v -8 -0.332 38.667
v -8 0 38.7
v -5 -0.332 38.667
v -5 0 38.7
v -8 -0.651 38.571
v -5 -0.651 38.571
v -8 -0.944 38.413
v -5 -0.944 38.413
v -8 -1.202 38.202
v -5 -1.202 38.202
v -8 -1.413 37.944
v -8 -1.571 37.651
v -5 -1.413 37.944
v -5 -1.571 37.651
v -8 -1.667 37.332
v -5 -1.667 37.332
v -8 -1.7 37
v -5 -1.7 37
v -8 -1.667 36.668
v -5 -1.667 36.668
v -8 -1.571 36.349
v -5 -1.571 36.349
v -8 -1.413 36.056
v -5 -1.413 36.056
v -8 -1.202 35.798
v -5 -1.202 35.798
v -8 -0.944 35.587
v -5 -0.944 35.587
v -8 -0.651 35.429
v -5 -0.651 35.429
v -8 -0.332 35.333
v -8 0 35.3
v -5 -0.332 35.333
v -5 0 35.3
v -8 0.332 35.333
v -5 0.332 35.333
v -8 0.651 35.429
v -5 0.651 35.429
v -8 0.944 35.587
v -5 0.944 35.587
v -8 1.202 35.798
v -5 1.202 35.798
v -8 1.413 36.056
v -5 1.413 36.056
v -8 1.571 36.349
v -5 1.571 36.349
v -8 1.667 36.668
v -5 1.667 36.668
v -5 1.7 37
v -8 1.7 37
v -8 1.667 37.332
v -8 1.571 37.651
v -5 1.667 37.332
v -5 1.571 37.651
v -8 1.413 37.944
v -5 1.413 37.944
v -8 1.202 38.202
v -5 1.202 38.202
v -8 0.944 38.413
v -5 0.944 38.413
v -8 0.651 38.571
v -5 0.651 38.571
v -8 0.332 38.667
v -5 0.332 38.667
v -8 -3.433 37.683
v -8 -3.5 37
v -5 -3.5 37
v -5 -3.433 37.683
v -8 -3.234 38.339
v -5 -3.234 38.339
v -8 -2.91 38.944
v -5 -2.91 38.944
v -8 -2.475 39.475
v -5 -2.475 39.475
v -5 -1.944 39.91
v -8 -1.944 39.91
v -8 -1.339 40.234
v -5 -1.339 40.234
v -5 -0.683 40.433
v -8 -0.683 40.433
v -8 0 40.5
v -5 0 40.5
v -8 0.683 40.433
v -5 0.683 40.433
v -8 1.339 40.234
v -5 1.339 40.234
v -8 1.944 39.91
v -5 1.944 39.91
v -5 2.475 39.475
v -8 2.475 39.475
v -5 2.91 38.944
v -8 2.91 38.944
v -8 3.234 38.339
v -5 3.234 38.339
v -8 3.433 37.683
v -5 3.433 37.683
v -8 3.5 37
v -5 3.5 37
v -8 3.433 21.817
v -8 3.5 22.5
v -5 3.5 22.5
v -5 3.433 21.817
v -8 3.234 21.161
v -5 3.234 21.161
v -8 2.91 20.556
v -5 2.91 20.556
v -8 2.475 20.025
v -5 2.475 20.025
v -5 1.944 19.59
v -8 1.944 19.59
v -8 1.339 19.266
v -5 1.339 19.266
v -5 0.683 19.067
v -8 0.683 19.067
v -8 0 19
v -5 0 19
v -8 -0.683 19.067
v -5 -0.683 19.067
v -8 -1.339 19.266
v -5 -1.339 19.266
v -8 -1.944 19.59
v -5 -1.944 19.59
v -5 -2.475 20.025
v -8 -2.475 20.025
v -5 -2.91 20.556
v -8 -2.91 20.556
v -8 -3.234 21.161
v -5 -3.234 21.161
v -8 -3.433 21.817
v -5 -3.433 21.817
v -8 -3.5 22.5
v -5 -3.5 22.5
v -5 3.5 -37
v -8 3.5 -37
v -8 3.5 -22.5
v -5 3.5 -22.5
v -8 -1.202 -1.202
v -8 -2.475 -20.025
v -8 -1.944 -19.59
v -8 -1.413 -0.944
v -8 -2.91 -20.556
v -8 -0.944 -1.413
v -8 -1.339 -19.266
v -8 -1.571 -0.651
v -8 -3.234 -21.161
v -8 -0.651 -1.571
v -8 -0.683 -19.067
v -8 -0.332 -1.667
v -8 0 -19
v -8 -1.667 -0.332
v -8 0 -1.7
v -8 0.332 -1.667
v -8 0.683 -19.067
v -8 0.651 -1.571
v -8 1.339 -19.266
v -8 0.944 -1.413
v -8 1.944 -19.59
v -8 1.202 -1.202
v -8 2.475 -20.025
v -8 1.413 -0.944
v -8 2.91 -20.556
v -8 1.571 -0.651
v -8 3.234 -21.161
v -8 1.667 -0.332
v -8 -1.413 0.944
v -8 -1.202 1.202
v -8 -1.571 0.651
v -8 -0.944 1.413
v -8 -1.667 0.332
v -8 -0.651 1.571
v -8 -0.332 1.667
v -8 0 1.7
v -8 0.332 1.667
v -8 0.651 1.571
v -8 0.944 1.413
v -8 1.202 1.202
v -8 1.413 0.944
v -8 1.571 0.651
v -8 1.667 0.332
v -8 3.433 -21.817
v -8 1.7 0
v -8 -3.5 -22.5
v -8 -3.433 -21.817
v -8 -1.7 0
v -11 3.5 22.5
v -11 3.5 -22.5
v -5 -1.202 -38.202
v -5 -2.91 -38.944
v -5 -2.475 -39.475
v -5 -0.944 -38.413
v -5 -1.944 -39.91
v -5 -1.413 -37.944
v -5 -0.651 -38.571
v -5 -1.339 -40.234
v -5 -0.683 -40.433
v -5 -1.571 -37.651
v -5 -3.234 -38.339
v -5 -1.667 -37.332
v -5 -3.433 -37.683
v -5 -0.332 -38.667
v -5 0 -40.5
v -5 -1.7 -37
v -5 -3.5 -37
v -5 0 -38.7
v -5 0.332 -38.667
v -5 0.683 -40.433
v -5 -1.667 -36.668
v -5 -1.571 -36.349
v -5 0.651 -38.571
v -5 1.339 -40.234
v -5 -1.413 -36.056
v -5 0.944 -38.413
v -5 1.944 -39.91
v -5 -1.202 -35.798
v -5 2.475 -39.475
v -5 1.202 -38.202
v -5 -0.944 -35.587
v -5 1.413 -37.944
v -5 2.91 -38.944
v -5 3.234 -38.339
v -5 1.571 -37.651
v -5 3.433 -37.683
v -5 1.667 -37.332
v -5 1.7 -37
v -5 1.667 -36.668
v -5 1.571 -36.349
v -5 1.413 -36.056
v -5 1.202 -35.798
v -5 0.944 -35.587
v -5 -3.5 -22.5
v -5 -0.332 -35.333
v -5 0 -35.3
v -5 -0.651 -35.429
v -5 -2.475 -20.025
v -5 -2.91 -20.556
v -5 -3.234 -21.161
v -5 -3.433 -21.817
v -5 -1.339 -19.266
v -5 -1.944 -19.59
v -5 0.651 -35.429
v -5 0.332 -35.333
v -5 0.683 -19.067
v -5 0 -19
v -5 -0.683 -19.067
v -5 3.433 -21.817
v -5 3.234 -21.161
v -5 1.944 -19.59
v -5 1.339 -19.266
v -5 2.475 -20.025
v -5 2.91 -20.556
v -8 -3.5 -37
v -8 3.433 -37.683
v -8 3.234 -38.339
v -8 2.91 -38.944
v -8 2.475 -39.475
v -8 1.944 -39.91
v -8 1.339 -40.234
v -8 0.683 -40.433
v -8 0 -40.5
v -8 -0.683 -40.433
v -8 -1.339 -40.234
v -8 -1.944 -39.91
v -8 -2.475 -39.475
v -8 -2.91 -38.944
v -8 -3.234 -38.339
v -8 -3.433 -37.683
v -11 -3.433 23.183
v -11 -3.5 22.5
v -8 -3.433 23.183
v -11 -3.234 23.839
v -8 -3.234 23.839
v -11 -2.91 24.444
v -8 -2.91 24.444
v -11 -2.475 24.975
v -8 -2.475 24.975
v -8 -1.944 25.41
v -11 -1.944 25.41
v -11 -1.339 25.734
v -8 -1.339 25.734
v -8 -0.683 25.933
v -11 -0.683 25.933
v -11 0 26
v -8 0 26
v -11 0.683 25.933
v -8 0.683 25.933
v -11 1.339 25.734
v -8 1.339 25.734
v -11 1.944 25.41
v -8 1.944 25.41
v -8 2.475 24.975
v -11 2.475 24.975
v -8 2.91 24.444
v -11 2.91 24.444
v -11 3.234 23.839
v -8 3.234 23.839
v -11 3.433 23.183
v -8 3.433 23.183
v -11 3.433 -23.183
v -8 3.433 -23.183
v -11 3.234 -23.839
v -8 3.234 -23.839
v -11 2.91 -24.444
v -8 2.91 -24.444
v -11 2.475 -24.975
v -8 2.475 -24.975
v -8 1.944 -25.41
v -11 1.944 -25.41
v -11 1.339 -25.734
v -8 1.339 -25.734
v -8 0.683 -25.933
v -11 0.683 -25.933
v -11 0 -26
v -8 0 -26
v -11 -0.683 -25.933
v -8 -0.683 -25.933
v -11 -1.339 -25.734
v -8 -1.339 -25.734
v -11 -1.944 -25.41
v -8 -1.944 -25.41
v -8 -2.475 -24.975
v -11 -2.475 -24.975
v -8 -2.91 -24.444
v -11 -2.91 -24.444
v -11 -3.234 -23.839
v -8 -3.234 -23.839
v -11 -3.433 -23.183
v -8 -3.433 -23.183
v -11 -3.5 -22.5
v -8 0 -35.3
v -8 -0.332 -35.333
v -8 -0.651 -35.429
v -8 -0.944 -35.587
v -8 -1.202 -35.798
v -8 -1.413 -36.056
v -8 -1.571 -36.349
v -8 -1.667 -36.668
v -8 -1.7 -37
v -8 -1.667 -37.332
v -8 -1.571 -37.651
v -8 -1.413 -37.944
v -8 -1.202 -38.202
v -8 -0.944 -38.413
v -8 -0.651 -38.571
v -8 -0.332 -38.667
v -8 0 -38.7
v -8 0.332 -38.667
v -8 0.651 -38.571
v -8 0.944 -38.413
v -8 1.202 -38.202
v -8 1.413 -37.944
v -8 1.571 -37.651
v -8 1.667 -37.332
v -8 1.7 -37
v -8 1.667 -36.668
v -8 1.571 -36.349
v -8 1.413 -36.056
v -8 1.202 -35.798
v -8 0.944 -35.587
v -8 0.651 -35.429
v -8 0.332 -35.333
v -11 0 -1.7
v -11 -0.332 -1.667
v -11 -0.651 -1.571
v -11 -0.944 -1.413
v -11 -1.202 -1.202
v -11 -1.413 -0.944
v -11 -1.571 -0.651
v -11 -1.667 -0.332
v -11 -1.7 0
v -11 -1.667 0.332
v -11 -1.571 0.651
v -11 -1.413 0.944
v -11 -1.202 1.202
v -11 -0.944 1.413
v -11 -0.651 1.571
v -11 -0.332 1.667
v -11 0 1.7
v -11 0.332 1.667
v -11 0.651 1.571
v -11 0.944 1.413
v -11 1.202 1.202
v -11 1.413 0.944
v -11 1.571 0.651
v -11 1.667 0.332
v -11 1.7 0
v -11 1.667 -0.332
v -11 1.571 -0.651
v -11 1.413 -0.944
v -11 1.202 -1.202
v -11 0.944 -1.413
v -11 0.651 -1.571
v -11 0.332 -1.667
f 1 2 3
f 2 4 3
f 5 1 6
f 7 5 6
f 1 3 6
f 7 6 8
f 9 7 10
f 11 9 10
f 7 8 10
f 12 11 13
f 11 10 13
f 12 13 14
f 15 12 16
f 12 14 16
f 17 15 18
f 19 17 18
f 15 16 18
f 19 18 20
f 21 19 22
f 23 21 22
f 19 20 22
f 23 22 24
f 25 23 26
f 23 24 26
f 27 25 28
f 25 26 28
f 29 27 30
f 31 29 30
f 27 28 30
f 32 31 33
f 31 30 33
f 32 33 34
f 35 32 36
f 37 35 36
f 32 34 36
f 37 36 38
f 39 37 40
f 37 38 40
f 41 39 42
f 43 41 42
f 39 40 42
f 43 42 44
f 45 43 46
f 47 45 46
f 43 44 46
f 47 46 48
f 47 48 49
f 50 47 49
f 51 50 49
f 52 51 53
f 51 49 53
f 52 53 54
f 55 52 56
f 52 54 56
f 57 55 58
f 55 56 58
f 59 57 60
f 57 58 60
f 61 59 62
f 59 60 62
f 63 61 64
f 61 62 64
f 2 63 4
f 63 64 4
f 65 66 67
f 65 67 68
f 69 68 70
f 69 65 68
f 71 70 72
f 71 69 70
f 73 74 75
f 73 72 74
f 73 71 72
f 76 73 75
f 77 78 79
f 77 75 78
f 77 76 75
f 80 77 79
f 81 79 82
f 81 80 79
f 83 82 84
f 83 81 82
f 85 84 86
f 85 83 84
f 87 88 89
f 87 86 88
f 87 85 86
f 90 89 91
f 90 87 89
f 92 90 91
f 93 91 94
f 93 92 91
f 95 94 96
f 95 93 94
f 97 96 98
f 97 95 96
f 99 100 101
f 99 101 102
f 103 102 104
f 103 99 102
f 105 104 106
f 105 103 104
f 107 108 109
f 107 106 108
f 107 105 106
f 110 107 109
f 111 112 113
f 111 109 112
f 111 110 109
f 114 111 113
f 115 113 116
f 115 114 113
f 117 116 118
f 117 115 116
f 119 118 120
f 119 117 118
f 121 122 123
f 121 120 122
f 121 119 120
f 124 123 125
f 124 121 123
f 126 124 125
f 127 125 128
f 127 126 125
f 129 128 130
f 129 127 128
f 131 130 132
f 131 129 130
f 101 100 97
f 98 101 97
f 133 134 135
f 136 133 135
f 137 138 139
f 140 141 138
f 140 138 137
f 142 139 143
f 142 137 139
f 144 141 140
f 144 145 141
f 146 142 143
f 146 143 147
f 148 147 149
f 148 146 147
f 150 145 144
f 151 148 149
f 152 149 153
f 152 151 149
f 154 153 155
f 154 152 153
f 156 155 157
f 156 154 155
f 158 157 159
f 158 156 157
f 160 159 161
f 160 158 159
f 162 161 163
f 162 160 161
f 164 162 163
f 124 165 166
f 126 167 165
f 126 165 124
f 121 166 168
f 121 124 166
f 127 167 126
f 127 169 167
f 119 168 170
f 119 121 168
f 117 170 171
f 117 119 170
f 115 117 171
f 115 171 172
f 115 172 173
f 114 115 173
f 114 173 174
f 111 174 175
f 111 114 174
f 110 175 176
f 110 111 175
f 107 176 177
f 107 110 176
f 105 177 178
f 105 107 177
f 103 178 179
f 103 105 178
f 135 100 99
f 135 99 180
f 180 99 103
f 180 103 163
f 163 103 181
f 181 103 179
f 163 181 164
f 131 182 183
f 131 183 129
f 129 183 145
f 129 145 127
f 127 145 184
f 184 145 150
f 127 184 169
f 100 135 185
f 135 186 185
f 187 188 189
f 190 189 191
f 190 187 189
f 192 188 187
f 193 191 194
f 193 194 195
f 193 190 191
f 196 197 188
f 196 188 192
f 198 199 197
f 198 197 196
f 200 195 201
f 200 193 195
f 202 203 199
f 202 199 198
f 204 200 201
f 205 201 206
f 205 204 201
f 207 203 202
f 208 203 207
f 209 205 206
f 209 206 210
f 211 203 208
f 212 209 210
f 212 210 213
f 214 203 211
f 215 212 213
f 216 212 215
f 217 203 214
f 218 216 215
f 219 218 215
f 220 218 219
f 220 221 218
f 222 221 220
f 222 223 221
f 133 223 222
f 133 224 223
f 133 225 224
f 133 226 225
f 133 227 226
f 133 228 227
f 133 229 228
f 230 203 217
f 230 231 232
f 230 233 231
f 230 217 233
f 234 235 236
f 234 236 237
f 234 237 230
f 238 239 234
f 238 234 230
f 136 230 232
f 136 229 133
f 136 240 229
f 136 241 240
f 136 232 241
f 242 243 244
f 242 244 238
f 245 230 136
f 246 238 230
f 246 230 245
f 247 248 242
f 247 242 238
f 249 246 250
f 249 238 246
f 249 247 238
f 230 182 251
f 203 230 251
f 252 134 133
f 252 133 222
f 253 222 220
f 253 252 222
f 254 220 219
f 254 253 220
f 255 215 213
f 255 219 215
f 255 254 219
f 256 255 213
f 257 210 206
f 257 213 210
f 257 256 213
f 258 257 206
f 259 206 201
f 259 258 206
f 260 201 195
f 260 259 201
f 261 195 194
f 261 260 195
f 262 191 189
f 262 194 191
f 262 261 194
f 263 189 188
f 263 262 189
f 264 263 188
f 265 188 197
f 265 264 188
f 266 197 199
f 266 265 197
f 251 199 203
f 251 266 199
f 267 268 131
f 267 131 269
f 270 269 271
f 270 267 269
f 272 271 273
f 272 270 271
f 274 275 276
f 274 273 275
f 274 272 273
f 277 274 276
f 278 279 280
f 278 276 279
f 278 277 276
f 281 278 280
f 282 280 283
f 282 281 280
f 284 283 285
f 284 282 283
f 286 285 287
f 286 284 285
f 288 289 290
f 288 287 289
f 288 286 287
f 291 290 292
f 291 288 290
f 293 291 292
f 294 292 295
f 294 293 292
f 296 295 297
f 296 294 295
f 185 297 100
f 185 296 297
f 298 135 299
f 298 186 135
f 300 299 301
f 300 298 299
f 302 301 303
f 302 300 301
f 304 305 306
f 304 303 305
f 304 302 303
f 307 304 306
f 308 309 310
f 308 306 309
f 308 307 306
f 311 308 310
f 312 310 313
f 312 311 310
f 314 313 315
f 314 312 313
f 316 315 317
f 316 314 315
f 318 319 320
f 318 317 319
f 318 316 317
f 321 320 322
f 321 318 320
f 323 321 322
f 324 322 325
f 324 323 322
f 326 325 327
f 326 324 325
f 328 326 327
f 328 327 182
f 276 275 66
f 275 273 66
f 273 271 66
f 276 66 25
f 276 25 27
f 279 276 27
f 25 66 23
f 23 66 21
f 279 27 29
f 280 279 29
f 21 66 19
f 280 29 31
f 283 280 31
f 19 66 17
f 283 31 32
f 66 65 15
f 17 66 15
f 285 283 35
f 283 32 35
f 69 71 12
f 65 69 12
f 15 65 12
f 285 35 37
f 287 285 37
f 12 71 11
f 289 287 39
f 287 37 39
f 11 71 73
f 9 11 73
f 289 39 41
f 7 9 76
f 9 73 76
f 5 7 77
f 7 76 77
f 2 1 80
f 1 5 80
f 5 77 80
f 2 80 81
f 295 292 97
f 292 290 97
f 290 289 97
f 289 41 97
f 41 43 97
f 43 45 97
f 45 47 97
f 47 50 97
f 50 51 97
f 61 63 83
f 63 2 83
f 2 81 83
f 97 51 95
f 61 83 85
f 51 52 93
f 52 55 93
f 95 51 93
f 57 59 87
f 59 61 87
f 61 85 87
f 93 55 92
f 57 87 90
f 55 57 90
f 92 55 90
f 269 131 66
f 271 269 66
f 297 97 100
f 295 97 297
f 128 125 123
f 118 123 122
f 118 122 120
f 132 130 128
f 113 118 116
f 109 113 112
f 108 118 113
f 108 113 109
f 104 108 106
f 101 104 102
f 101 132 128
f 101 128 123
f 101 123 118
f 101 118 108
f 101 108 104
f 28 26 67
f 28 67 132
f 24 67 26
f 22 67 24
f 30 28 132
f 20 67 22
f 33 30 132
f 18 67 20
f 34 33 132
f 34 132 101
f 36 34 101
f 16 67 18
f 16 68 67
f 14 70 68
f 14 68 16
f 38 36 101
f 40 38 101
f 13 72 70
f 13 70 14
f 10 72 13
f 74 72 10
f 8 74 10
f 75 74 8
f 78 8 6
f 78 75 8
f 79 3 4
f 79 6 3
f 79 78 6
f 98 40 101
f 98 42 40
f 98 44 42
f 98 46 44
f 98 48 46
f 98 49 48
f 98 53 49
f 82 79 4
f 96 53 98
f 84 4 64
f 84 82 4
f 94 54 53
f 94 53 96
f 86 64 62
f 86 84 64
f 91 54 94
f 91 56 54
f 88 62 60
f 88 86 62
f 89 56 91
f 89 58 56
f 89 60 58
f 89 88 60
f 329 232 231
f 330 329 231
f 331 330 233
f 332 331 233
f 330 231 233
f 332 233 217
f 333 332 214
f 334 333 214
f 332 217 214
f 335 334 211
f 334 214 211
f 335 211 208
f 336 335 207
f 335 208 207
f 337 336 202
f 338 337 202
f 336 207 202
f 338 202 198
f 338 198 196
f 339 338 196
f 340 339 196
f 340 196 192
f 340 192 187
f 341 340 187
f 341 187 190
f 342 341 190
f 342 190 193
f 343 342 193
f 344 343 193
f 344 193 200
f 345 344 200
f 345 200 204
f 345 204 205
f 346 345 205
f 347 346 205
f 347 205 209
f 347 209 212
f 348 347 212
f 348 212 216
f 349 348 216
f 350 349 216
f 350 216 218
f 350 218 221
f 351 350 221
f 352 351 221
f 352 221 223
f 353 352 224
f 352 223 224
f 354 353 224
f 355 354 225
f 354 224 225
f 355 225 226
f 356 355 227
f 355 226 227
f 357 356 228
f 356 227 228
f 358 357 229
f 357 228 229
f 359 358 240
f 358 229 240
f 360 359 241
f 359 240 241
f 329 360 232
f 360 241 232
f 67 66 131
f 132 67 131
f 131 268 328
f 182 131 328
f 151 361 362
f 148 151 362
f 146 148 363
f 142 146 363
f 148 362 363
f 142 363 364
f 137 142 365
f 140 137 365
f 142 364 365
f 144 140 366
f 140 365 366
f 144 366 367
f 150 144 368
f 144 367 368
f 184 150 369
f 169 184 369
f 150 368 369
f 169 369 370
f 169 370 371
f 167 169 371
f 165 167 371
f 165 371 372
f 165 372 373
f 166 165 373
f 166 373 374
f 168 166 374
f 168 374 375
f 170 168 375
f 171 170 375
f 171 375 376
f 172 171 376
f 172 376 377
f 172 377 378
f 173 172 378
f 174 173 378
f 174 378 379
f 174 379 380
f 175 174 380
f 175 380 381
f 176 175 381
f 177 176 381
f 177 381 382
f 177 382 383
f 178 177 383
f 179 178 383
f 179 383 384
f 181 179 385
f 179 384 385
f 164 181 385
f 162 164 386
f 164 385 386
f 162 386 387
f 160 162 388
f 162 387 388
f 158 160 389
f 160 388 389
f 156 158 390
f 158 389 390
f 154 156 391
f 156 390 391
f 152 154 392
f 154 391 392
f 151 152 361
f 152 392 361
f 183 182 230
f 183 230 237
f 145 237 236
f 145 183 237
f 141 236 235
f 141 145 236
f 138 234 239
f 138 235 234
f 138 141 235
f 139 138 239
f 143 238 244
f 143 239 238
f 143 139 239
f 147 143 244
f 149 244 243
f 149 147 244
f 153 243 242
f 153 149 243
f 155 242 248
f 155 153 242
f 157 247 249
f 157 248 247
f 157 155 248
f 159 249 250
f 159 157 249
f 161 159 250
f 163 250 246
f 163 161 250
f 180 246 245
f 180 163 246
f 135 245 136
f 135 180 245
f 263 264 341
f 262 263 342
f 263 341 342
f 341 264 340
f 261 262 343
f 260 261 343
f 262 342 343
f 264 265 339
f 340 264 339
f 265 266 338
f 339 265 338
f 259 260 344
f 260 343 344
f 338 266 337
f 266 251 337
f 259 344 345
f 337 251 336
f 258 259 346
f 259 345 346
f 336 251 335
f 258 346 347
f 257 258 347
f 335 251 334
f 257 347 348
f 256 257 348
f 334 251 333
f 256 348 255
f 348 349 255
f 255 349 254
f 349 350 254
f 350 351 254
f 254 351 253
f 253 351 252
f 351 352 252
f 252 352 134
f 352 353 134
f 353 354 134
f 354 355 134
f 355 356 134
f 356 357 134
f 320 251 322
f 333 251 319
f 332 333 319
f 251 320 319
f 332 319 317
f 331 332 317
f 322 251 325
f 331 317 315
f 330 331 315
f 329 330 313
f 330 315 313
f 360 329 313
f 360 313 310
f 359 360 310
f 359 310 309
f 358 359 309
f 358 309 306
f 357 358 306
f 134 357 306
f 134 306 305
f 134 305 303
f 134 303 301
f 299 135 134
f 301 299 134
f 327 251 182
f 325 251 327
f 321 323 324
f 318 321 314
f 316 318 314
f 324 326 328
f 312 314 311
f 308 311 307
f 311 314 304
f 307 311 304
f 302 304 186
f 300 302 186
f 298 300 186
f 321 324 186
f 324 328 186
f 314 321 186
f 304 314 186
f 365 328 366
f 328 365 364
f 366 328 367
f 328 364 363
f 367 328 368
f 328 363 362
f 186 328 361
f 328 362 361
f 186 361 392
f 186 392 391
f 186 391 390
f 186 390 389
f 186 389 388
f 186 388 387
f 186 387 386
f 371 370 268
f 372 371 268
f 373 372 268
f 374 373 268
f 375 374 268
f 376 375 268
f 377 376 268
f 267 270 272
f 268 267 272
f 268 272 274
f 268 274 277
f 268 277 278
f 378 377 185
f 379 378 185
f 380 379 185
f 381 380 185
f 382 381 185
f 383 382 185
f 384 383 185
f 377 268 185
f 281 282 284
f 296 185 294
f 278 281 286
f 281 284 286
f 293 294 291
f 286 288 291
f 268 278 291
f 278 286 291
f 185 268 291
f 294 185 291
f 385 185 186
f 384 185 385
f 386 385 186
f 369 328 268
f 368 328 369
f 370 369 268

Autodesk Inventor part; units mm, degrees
ref_plane "YZ Plane" through (0, 0, 0) normal (1, 0, 0) x (0, 1, 0)
ref_plane "XZ Plane" through (0, 0, 0) normal (0, 1, 0) x (-1, 0, 0)
ref_plane "XY Plane" through (0, 0, 0) normal (0, 0, 1) x (1, 0, 0)
sketch "Sketch1" plane through (0, 0, 0) normal (1, 0, 0) x (0, 1, 0)
  line L0 (0, -37) -> (0, 37) construction
  line L1 (3.5, -37) -> (3.5, 37)
  line L2 (-3.5, 37) -> (-3.5, -37)
  arc A0 (-3.5, -37) -> (3.5, -37) centre (0, -37) ccw
  arc A1 (3.5, 37) -> (-3.5, 37) centre (0, 37) ccw
  circle A2 centre (0, 37) radius 1.5
  circle A3 centre (0, 0) radius 1.5
  circle A4 centre (0, -37) radius 1.5
  line L3 (0, -22.5) -> (0, 22.5) construction
  line L4 (3.5, -22.5) -> (3.5, 22.5)
  line L5 (-3.5, 22.5) -> (-3.5, -22.5)
  arc A5 (-3.5, -22.5) -> (3.5, -22.5) centre (0, -22.5) ccw
  arc A6 (3.5, 22.5) -> (-3.5, 22.5) centre (0, 22.5) ccw
  line L6 (0, -37) -> (0, -22.5) construction
  line L7 (-3.5, -37) -> (-3.5, -22.5)
  line L8 (3.5, -22.5) -> (3.5, -37)
  arc A7 (-3.5, -37) -> (3.5, -37) centre (0, -37) ccw
  arc A8 (3.5, -22.5) -> (-3.5, -22.5) centre (0, -22.5) ccw
  line L9 (3.5, 0) -> (-3.5, 0) construction
  line L10 (0, 37) -> (0, 22.5) construction
  line L11 (-3.5, 37) -> (-3.5, 22.5)
  line L12 (3.5, 22.5) -> (3.5, 37)
  arc A9 (3.5, 37) -> (-3.5, 37) centre (0, 37) ccw
  arc A10 (-3.5, 22.5) -> (3.5, 22.5) centre (0, 22.5) ccw
  point P0 (0, -40.5)
  point P1 (0, 40.5)
  point P2 (0, -29.75)
  point P3 (0, 29.75)
  dimension "d18" = 81
  dimension "d19" = 3
  dimension "d20" = 7
  dimension "d32" = 45
extrude "Extrusión3" add sketch "Sketch1" along normal mid plane 22 contours A8 L2 A10 L1 | A5 A8 | A10 A6 | A3
extrude "Extrusión4" cut sketch "Sketch1" along normal mid plane 16 contours A8 L2 A10 L1 | A5 A8 | A10 A6 | A3
extrude "Extrusión5" add sketch "Sketch1" along normal mid plane 16 contours A0 L2 A5 L1 | A5 A8 | A6 L2 A1 L1 | A10 A6 | A2 | A4
extrude "Extrusión6" cut sketch "Sketch1" along normal mid plane 10 contours A0 L2 A5 L1 | A5 A8 | A6 L2 A1 L1 | A10 A6 | A2 | A4
sketch "Boceto2" plane through (-8, 0, 0) normal (-1, 0, 0) x (0, 0, 1)
  point P0 (-37, 0)
  point P1 (37, 0)
hole "Agujero1" at (-8, 0, -37) at (-8, 0, 37) direction (1, 0, 0) diameter 3.4 end through all clearance for "Tornillo de cabeza plana avellanada ISO 2009/7046" size "M3" standard "ISO"
sketch "Boceto3" plane through (11, 0, 0) normal (1, 0, 0) x (0, 0, -1)
  point P0 (0, 0)
  point P1 (0, 0)
hole "Agujero2" at (11, 0, 0) direction (-1, 0, 0) diameter 3.4 end through all clearance for "Tornillo de cabeza plana avellanada ISO 2009/7046" size "M3" standard "ISO"
sketch "Boceto4" plane through (11, 0, 0) normal (1, 0, 0) x (0, 0, -1)
  line L0 (-22.5, 3.5) -> (-37, 3.5) projected
  arc A0 (-37, 3.5) -> (-37, -3.5) centre (-37, 0) ccw projected
  line L1 (-37, -3.5) -> (-22.5, -3.5) projected
  line L2 (-22.5, -3.5) -> (22.5, -3.5) projected
  line L3 (22.5, 3.5) -> (-22.5, 3.5) projected
  line L4 (37, 3.5) -> (22.5, 3.5) projected
  arc A1 (37, -3.5) -> (37, 3.5) centre (37, 0) ccw projected
  line L5 (22.5, -3.5) -> (37, -3.5) projected
  point P0 (0, 0)
extrude "Extrusión7" cut sketch "Boceto4" against normal blind 10
equation "\"d35\" = Dedos"
equation "\"Dedos\" = 10"
properties part number "Corredera I"
